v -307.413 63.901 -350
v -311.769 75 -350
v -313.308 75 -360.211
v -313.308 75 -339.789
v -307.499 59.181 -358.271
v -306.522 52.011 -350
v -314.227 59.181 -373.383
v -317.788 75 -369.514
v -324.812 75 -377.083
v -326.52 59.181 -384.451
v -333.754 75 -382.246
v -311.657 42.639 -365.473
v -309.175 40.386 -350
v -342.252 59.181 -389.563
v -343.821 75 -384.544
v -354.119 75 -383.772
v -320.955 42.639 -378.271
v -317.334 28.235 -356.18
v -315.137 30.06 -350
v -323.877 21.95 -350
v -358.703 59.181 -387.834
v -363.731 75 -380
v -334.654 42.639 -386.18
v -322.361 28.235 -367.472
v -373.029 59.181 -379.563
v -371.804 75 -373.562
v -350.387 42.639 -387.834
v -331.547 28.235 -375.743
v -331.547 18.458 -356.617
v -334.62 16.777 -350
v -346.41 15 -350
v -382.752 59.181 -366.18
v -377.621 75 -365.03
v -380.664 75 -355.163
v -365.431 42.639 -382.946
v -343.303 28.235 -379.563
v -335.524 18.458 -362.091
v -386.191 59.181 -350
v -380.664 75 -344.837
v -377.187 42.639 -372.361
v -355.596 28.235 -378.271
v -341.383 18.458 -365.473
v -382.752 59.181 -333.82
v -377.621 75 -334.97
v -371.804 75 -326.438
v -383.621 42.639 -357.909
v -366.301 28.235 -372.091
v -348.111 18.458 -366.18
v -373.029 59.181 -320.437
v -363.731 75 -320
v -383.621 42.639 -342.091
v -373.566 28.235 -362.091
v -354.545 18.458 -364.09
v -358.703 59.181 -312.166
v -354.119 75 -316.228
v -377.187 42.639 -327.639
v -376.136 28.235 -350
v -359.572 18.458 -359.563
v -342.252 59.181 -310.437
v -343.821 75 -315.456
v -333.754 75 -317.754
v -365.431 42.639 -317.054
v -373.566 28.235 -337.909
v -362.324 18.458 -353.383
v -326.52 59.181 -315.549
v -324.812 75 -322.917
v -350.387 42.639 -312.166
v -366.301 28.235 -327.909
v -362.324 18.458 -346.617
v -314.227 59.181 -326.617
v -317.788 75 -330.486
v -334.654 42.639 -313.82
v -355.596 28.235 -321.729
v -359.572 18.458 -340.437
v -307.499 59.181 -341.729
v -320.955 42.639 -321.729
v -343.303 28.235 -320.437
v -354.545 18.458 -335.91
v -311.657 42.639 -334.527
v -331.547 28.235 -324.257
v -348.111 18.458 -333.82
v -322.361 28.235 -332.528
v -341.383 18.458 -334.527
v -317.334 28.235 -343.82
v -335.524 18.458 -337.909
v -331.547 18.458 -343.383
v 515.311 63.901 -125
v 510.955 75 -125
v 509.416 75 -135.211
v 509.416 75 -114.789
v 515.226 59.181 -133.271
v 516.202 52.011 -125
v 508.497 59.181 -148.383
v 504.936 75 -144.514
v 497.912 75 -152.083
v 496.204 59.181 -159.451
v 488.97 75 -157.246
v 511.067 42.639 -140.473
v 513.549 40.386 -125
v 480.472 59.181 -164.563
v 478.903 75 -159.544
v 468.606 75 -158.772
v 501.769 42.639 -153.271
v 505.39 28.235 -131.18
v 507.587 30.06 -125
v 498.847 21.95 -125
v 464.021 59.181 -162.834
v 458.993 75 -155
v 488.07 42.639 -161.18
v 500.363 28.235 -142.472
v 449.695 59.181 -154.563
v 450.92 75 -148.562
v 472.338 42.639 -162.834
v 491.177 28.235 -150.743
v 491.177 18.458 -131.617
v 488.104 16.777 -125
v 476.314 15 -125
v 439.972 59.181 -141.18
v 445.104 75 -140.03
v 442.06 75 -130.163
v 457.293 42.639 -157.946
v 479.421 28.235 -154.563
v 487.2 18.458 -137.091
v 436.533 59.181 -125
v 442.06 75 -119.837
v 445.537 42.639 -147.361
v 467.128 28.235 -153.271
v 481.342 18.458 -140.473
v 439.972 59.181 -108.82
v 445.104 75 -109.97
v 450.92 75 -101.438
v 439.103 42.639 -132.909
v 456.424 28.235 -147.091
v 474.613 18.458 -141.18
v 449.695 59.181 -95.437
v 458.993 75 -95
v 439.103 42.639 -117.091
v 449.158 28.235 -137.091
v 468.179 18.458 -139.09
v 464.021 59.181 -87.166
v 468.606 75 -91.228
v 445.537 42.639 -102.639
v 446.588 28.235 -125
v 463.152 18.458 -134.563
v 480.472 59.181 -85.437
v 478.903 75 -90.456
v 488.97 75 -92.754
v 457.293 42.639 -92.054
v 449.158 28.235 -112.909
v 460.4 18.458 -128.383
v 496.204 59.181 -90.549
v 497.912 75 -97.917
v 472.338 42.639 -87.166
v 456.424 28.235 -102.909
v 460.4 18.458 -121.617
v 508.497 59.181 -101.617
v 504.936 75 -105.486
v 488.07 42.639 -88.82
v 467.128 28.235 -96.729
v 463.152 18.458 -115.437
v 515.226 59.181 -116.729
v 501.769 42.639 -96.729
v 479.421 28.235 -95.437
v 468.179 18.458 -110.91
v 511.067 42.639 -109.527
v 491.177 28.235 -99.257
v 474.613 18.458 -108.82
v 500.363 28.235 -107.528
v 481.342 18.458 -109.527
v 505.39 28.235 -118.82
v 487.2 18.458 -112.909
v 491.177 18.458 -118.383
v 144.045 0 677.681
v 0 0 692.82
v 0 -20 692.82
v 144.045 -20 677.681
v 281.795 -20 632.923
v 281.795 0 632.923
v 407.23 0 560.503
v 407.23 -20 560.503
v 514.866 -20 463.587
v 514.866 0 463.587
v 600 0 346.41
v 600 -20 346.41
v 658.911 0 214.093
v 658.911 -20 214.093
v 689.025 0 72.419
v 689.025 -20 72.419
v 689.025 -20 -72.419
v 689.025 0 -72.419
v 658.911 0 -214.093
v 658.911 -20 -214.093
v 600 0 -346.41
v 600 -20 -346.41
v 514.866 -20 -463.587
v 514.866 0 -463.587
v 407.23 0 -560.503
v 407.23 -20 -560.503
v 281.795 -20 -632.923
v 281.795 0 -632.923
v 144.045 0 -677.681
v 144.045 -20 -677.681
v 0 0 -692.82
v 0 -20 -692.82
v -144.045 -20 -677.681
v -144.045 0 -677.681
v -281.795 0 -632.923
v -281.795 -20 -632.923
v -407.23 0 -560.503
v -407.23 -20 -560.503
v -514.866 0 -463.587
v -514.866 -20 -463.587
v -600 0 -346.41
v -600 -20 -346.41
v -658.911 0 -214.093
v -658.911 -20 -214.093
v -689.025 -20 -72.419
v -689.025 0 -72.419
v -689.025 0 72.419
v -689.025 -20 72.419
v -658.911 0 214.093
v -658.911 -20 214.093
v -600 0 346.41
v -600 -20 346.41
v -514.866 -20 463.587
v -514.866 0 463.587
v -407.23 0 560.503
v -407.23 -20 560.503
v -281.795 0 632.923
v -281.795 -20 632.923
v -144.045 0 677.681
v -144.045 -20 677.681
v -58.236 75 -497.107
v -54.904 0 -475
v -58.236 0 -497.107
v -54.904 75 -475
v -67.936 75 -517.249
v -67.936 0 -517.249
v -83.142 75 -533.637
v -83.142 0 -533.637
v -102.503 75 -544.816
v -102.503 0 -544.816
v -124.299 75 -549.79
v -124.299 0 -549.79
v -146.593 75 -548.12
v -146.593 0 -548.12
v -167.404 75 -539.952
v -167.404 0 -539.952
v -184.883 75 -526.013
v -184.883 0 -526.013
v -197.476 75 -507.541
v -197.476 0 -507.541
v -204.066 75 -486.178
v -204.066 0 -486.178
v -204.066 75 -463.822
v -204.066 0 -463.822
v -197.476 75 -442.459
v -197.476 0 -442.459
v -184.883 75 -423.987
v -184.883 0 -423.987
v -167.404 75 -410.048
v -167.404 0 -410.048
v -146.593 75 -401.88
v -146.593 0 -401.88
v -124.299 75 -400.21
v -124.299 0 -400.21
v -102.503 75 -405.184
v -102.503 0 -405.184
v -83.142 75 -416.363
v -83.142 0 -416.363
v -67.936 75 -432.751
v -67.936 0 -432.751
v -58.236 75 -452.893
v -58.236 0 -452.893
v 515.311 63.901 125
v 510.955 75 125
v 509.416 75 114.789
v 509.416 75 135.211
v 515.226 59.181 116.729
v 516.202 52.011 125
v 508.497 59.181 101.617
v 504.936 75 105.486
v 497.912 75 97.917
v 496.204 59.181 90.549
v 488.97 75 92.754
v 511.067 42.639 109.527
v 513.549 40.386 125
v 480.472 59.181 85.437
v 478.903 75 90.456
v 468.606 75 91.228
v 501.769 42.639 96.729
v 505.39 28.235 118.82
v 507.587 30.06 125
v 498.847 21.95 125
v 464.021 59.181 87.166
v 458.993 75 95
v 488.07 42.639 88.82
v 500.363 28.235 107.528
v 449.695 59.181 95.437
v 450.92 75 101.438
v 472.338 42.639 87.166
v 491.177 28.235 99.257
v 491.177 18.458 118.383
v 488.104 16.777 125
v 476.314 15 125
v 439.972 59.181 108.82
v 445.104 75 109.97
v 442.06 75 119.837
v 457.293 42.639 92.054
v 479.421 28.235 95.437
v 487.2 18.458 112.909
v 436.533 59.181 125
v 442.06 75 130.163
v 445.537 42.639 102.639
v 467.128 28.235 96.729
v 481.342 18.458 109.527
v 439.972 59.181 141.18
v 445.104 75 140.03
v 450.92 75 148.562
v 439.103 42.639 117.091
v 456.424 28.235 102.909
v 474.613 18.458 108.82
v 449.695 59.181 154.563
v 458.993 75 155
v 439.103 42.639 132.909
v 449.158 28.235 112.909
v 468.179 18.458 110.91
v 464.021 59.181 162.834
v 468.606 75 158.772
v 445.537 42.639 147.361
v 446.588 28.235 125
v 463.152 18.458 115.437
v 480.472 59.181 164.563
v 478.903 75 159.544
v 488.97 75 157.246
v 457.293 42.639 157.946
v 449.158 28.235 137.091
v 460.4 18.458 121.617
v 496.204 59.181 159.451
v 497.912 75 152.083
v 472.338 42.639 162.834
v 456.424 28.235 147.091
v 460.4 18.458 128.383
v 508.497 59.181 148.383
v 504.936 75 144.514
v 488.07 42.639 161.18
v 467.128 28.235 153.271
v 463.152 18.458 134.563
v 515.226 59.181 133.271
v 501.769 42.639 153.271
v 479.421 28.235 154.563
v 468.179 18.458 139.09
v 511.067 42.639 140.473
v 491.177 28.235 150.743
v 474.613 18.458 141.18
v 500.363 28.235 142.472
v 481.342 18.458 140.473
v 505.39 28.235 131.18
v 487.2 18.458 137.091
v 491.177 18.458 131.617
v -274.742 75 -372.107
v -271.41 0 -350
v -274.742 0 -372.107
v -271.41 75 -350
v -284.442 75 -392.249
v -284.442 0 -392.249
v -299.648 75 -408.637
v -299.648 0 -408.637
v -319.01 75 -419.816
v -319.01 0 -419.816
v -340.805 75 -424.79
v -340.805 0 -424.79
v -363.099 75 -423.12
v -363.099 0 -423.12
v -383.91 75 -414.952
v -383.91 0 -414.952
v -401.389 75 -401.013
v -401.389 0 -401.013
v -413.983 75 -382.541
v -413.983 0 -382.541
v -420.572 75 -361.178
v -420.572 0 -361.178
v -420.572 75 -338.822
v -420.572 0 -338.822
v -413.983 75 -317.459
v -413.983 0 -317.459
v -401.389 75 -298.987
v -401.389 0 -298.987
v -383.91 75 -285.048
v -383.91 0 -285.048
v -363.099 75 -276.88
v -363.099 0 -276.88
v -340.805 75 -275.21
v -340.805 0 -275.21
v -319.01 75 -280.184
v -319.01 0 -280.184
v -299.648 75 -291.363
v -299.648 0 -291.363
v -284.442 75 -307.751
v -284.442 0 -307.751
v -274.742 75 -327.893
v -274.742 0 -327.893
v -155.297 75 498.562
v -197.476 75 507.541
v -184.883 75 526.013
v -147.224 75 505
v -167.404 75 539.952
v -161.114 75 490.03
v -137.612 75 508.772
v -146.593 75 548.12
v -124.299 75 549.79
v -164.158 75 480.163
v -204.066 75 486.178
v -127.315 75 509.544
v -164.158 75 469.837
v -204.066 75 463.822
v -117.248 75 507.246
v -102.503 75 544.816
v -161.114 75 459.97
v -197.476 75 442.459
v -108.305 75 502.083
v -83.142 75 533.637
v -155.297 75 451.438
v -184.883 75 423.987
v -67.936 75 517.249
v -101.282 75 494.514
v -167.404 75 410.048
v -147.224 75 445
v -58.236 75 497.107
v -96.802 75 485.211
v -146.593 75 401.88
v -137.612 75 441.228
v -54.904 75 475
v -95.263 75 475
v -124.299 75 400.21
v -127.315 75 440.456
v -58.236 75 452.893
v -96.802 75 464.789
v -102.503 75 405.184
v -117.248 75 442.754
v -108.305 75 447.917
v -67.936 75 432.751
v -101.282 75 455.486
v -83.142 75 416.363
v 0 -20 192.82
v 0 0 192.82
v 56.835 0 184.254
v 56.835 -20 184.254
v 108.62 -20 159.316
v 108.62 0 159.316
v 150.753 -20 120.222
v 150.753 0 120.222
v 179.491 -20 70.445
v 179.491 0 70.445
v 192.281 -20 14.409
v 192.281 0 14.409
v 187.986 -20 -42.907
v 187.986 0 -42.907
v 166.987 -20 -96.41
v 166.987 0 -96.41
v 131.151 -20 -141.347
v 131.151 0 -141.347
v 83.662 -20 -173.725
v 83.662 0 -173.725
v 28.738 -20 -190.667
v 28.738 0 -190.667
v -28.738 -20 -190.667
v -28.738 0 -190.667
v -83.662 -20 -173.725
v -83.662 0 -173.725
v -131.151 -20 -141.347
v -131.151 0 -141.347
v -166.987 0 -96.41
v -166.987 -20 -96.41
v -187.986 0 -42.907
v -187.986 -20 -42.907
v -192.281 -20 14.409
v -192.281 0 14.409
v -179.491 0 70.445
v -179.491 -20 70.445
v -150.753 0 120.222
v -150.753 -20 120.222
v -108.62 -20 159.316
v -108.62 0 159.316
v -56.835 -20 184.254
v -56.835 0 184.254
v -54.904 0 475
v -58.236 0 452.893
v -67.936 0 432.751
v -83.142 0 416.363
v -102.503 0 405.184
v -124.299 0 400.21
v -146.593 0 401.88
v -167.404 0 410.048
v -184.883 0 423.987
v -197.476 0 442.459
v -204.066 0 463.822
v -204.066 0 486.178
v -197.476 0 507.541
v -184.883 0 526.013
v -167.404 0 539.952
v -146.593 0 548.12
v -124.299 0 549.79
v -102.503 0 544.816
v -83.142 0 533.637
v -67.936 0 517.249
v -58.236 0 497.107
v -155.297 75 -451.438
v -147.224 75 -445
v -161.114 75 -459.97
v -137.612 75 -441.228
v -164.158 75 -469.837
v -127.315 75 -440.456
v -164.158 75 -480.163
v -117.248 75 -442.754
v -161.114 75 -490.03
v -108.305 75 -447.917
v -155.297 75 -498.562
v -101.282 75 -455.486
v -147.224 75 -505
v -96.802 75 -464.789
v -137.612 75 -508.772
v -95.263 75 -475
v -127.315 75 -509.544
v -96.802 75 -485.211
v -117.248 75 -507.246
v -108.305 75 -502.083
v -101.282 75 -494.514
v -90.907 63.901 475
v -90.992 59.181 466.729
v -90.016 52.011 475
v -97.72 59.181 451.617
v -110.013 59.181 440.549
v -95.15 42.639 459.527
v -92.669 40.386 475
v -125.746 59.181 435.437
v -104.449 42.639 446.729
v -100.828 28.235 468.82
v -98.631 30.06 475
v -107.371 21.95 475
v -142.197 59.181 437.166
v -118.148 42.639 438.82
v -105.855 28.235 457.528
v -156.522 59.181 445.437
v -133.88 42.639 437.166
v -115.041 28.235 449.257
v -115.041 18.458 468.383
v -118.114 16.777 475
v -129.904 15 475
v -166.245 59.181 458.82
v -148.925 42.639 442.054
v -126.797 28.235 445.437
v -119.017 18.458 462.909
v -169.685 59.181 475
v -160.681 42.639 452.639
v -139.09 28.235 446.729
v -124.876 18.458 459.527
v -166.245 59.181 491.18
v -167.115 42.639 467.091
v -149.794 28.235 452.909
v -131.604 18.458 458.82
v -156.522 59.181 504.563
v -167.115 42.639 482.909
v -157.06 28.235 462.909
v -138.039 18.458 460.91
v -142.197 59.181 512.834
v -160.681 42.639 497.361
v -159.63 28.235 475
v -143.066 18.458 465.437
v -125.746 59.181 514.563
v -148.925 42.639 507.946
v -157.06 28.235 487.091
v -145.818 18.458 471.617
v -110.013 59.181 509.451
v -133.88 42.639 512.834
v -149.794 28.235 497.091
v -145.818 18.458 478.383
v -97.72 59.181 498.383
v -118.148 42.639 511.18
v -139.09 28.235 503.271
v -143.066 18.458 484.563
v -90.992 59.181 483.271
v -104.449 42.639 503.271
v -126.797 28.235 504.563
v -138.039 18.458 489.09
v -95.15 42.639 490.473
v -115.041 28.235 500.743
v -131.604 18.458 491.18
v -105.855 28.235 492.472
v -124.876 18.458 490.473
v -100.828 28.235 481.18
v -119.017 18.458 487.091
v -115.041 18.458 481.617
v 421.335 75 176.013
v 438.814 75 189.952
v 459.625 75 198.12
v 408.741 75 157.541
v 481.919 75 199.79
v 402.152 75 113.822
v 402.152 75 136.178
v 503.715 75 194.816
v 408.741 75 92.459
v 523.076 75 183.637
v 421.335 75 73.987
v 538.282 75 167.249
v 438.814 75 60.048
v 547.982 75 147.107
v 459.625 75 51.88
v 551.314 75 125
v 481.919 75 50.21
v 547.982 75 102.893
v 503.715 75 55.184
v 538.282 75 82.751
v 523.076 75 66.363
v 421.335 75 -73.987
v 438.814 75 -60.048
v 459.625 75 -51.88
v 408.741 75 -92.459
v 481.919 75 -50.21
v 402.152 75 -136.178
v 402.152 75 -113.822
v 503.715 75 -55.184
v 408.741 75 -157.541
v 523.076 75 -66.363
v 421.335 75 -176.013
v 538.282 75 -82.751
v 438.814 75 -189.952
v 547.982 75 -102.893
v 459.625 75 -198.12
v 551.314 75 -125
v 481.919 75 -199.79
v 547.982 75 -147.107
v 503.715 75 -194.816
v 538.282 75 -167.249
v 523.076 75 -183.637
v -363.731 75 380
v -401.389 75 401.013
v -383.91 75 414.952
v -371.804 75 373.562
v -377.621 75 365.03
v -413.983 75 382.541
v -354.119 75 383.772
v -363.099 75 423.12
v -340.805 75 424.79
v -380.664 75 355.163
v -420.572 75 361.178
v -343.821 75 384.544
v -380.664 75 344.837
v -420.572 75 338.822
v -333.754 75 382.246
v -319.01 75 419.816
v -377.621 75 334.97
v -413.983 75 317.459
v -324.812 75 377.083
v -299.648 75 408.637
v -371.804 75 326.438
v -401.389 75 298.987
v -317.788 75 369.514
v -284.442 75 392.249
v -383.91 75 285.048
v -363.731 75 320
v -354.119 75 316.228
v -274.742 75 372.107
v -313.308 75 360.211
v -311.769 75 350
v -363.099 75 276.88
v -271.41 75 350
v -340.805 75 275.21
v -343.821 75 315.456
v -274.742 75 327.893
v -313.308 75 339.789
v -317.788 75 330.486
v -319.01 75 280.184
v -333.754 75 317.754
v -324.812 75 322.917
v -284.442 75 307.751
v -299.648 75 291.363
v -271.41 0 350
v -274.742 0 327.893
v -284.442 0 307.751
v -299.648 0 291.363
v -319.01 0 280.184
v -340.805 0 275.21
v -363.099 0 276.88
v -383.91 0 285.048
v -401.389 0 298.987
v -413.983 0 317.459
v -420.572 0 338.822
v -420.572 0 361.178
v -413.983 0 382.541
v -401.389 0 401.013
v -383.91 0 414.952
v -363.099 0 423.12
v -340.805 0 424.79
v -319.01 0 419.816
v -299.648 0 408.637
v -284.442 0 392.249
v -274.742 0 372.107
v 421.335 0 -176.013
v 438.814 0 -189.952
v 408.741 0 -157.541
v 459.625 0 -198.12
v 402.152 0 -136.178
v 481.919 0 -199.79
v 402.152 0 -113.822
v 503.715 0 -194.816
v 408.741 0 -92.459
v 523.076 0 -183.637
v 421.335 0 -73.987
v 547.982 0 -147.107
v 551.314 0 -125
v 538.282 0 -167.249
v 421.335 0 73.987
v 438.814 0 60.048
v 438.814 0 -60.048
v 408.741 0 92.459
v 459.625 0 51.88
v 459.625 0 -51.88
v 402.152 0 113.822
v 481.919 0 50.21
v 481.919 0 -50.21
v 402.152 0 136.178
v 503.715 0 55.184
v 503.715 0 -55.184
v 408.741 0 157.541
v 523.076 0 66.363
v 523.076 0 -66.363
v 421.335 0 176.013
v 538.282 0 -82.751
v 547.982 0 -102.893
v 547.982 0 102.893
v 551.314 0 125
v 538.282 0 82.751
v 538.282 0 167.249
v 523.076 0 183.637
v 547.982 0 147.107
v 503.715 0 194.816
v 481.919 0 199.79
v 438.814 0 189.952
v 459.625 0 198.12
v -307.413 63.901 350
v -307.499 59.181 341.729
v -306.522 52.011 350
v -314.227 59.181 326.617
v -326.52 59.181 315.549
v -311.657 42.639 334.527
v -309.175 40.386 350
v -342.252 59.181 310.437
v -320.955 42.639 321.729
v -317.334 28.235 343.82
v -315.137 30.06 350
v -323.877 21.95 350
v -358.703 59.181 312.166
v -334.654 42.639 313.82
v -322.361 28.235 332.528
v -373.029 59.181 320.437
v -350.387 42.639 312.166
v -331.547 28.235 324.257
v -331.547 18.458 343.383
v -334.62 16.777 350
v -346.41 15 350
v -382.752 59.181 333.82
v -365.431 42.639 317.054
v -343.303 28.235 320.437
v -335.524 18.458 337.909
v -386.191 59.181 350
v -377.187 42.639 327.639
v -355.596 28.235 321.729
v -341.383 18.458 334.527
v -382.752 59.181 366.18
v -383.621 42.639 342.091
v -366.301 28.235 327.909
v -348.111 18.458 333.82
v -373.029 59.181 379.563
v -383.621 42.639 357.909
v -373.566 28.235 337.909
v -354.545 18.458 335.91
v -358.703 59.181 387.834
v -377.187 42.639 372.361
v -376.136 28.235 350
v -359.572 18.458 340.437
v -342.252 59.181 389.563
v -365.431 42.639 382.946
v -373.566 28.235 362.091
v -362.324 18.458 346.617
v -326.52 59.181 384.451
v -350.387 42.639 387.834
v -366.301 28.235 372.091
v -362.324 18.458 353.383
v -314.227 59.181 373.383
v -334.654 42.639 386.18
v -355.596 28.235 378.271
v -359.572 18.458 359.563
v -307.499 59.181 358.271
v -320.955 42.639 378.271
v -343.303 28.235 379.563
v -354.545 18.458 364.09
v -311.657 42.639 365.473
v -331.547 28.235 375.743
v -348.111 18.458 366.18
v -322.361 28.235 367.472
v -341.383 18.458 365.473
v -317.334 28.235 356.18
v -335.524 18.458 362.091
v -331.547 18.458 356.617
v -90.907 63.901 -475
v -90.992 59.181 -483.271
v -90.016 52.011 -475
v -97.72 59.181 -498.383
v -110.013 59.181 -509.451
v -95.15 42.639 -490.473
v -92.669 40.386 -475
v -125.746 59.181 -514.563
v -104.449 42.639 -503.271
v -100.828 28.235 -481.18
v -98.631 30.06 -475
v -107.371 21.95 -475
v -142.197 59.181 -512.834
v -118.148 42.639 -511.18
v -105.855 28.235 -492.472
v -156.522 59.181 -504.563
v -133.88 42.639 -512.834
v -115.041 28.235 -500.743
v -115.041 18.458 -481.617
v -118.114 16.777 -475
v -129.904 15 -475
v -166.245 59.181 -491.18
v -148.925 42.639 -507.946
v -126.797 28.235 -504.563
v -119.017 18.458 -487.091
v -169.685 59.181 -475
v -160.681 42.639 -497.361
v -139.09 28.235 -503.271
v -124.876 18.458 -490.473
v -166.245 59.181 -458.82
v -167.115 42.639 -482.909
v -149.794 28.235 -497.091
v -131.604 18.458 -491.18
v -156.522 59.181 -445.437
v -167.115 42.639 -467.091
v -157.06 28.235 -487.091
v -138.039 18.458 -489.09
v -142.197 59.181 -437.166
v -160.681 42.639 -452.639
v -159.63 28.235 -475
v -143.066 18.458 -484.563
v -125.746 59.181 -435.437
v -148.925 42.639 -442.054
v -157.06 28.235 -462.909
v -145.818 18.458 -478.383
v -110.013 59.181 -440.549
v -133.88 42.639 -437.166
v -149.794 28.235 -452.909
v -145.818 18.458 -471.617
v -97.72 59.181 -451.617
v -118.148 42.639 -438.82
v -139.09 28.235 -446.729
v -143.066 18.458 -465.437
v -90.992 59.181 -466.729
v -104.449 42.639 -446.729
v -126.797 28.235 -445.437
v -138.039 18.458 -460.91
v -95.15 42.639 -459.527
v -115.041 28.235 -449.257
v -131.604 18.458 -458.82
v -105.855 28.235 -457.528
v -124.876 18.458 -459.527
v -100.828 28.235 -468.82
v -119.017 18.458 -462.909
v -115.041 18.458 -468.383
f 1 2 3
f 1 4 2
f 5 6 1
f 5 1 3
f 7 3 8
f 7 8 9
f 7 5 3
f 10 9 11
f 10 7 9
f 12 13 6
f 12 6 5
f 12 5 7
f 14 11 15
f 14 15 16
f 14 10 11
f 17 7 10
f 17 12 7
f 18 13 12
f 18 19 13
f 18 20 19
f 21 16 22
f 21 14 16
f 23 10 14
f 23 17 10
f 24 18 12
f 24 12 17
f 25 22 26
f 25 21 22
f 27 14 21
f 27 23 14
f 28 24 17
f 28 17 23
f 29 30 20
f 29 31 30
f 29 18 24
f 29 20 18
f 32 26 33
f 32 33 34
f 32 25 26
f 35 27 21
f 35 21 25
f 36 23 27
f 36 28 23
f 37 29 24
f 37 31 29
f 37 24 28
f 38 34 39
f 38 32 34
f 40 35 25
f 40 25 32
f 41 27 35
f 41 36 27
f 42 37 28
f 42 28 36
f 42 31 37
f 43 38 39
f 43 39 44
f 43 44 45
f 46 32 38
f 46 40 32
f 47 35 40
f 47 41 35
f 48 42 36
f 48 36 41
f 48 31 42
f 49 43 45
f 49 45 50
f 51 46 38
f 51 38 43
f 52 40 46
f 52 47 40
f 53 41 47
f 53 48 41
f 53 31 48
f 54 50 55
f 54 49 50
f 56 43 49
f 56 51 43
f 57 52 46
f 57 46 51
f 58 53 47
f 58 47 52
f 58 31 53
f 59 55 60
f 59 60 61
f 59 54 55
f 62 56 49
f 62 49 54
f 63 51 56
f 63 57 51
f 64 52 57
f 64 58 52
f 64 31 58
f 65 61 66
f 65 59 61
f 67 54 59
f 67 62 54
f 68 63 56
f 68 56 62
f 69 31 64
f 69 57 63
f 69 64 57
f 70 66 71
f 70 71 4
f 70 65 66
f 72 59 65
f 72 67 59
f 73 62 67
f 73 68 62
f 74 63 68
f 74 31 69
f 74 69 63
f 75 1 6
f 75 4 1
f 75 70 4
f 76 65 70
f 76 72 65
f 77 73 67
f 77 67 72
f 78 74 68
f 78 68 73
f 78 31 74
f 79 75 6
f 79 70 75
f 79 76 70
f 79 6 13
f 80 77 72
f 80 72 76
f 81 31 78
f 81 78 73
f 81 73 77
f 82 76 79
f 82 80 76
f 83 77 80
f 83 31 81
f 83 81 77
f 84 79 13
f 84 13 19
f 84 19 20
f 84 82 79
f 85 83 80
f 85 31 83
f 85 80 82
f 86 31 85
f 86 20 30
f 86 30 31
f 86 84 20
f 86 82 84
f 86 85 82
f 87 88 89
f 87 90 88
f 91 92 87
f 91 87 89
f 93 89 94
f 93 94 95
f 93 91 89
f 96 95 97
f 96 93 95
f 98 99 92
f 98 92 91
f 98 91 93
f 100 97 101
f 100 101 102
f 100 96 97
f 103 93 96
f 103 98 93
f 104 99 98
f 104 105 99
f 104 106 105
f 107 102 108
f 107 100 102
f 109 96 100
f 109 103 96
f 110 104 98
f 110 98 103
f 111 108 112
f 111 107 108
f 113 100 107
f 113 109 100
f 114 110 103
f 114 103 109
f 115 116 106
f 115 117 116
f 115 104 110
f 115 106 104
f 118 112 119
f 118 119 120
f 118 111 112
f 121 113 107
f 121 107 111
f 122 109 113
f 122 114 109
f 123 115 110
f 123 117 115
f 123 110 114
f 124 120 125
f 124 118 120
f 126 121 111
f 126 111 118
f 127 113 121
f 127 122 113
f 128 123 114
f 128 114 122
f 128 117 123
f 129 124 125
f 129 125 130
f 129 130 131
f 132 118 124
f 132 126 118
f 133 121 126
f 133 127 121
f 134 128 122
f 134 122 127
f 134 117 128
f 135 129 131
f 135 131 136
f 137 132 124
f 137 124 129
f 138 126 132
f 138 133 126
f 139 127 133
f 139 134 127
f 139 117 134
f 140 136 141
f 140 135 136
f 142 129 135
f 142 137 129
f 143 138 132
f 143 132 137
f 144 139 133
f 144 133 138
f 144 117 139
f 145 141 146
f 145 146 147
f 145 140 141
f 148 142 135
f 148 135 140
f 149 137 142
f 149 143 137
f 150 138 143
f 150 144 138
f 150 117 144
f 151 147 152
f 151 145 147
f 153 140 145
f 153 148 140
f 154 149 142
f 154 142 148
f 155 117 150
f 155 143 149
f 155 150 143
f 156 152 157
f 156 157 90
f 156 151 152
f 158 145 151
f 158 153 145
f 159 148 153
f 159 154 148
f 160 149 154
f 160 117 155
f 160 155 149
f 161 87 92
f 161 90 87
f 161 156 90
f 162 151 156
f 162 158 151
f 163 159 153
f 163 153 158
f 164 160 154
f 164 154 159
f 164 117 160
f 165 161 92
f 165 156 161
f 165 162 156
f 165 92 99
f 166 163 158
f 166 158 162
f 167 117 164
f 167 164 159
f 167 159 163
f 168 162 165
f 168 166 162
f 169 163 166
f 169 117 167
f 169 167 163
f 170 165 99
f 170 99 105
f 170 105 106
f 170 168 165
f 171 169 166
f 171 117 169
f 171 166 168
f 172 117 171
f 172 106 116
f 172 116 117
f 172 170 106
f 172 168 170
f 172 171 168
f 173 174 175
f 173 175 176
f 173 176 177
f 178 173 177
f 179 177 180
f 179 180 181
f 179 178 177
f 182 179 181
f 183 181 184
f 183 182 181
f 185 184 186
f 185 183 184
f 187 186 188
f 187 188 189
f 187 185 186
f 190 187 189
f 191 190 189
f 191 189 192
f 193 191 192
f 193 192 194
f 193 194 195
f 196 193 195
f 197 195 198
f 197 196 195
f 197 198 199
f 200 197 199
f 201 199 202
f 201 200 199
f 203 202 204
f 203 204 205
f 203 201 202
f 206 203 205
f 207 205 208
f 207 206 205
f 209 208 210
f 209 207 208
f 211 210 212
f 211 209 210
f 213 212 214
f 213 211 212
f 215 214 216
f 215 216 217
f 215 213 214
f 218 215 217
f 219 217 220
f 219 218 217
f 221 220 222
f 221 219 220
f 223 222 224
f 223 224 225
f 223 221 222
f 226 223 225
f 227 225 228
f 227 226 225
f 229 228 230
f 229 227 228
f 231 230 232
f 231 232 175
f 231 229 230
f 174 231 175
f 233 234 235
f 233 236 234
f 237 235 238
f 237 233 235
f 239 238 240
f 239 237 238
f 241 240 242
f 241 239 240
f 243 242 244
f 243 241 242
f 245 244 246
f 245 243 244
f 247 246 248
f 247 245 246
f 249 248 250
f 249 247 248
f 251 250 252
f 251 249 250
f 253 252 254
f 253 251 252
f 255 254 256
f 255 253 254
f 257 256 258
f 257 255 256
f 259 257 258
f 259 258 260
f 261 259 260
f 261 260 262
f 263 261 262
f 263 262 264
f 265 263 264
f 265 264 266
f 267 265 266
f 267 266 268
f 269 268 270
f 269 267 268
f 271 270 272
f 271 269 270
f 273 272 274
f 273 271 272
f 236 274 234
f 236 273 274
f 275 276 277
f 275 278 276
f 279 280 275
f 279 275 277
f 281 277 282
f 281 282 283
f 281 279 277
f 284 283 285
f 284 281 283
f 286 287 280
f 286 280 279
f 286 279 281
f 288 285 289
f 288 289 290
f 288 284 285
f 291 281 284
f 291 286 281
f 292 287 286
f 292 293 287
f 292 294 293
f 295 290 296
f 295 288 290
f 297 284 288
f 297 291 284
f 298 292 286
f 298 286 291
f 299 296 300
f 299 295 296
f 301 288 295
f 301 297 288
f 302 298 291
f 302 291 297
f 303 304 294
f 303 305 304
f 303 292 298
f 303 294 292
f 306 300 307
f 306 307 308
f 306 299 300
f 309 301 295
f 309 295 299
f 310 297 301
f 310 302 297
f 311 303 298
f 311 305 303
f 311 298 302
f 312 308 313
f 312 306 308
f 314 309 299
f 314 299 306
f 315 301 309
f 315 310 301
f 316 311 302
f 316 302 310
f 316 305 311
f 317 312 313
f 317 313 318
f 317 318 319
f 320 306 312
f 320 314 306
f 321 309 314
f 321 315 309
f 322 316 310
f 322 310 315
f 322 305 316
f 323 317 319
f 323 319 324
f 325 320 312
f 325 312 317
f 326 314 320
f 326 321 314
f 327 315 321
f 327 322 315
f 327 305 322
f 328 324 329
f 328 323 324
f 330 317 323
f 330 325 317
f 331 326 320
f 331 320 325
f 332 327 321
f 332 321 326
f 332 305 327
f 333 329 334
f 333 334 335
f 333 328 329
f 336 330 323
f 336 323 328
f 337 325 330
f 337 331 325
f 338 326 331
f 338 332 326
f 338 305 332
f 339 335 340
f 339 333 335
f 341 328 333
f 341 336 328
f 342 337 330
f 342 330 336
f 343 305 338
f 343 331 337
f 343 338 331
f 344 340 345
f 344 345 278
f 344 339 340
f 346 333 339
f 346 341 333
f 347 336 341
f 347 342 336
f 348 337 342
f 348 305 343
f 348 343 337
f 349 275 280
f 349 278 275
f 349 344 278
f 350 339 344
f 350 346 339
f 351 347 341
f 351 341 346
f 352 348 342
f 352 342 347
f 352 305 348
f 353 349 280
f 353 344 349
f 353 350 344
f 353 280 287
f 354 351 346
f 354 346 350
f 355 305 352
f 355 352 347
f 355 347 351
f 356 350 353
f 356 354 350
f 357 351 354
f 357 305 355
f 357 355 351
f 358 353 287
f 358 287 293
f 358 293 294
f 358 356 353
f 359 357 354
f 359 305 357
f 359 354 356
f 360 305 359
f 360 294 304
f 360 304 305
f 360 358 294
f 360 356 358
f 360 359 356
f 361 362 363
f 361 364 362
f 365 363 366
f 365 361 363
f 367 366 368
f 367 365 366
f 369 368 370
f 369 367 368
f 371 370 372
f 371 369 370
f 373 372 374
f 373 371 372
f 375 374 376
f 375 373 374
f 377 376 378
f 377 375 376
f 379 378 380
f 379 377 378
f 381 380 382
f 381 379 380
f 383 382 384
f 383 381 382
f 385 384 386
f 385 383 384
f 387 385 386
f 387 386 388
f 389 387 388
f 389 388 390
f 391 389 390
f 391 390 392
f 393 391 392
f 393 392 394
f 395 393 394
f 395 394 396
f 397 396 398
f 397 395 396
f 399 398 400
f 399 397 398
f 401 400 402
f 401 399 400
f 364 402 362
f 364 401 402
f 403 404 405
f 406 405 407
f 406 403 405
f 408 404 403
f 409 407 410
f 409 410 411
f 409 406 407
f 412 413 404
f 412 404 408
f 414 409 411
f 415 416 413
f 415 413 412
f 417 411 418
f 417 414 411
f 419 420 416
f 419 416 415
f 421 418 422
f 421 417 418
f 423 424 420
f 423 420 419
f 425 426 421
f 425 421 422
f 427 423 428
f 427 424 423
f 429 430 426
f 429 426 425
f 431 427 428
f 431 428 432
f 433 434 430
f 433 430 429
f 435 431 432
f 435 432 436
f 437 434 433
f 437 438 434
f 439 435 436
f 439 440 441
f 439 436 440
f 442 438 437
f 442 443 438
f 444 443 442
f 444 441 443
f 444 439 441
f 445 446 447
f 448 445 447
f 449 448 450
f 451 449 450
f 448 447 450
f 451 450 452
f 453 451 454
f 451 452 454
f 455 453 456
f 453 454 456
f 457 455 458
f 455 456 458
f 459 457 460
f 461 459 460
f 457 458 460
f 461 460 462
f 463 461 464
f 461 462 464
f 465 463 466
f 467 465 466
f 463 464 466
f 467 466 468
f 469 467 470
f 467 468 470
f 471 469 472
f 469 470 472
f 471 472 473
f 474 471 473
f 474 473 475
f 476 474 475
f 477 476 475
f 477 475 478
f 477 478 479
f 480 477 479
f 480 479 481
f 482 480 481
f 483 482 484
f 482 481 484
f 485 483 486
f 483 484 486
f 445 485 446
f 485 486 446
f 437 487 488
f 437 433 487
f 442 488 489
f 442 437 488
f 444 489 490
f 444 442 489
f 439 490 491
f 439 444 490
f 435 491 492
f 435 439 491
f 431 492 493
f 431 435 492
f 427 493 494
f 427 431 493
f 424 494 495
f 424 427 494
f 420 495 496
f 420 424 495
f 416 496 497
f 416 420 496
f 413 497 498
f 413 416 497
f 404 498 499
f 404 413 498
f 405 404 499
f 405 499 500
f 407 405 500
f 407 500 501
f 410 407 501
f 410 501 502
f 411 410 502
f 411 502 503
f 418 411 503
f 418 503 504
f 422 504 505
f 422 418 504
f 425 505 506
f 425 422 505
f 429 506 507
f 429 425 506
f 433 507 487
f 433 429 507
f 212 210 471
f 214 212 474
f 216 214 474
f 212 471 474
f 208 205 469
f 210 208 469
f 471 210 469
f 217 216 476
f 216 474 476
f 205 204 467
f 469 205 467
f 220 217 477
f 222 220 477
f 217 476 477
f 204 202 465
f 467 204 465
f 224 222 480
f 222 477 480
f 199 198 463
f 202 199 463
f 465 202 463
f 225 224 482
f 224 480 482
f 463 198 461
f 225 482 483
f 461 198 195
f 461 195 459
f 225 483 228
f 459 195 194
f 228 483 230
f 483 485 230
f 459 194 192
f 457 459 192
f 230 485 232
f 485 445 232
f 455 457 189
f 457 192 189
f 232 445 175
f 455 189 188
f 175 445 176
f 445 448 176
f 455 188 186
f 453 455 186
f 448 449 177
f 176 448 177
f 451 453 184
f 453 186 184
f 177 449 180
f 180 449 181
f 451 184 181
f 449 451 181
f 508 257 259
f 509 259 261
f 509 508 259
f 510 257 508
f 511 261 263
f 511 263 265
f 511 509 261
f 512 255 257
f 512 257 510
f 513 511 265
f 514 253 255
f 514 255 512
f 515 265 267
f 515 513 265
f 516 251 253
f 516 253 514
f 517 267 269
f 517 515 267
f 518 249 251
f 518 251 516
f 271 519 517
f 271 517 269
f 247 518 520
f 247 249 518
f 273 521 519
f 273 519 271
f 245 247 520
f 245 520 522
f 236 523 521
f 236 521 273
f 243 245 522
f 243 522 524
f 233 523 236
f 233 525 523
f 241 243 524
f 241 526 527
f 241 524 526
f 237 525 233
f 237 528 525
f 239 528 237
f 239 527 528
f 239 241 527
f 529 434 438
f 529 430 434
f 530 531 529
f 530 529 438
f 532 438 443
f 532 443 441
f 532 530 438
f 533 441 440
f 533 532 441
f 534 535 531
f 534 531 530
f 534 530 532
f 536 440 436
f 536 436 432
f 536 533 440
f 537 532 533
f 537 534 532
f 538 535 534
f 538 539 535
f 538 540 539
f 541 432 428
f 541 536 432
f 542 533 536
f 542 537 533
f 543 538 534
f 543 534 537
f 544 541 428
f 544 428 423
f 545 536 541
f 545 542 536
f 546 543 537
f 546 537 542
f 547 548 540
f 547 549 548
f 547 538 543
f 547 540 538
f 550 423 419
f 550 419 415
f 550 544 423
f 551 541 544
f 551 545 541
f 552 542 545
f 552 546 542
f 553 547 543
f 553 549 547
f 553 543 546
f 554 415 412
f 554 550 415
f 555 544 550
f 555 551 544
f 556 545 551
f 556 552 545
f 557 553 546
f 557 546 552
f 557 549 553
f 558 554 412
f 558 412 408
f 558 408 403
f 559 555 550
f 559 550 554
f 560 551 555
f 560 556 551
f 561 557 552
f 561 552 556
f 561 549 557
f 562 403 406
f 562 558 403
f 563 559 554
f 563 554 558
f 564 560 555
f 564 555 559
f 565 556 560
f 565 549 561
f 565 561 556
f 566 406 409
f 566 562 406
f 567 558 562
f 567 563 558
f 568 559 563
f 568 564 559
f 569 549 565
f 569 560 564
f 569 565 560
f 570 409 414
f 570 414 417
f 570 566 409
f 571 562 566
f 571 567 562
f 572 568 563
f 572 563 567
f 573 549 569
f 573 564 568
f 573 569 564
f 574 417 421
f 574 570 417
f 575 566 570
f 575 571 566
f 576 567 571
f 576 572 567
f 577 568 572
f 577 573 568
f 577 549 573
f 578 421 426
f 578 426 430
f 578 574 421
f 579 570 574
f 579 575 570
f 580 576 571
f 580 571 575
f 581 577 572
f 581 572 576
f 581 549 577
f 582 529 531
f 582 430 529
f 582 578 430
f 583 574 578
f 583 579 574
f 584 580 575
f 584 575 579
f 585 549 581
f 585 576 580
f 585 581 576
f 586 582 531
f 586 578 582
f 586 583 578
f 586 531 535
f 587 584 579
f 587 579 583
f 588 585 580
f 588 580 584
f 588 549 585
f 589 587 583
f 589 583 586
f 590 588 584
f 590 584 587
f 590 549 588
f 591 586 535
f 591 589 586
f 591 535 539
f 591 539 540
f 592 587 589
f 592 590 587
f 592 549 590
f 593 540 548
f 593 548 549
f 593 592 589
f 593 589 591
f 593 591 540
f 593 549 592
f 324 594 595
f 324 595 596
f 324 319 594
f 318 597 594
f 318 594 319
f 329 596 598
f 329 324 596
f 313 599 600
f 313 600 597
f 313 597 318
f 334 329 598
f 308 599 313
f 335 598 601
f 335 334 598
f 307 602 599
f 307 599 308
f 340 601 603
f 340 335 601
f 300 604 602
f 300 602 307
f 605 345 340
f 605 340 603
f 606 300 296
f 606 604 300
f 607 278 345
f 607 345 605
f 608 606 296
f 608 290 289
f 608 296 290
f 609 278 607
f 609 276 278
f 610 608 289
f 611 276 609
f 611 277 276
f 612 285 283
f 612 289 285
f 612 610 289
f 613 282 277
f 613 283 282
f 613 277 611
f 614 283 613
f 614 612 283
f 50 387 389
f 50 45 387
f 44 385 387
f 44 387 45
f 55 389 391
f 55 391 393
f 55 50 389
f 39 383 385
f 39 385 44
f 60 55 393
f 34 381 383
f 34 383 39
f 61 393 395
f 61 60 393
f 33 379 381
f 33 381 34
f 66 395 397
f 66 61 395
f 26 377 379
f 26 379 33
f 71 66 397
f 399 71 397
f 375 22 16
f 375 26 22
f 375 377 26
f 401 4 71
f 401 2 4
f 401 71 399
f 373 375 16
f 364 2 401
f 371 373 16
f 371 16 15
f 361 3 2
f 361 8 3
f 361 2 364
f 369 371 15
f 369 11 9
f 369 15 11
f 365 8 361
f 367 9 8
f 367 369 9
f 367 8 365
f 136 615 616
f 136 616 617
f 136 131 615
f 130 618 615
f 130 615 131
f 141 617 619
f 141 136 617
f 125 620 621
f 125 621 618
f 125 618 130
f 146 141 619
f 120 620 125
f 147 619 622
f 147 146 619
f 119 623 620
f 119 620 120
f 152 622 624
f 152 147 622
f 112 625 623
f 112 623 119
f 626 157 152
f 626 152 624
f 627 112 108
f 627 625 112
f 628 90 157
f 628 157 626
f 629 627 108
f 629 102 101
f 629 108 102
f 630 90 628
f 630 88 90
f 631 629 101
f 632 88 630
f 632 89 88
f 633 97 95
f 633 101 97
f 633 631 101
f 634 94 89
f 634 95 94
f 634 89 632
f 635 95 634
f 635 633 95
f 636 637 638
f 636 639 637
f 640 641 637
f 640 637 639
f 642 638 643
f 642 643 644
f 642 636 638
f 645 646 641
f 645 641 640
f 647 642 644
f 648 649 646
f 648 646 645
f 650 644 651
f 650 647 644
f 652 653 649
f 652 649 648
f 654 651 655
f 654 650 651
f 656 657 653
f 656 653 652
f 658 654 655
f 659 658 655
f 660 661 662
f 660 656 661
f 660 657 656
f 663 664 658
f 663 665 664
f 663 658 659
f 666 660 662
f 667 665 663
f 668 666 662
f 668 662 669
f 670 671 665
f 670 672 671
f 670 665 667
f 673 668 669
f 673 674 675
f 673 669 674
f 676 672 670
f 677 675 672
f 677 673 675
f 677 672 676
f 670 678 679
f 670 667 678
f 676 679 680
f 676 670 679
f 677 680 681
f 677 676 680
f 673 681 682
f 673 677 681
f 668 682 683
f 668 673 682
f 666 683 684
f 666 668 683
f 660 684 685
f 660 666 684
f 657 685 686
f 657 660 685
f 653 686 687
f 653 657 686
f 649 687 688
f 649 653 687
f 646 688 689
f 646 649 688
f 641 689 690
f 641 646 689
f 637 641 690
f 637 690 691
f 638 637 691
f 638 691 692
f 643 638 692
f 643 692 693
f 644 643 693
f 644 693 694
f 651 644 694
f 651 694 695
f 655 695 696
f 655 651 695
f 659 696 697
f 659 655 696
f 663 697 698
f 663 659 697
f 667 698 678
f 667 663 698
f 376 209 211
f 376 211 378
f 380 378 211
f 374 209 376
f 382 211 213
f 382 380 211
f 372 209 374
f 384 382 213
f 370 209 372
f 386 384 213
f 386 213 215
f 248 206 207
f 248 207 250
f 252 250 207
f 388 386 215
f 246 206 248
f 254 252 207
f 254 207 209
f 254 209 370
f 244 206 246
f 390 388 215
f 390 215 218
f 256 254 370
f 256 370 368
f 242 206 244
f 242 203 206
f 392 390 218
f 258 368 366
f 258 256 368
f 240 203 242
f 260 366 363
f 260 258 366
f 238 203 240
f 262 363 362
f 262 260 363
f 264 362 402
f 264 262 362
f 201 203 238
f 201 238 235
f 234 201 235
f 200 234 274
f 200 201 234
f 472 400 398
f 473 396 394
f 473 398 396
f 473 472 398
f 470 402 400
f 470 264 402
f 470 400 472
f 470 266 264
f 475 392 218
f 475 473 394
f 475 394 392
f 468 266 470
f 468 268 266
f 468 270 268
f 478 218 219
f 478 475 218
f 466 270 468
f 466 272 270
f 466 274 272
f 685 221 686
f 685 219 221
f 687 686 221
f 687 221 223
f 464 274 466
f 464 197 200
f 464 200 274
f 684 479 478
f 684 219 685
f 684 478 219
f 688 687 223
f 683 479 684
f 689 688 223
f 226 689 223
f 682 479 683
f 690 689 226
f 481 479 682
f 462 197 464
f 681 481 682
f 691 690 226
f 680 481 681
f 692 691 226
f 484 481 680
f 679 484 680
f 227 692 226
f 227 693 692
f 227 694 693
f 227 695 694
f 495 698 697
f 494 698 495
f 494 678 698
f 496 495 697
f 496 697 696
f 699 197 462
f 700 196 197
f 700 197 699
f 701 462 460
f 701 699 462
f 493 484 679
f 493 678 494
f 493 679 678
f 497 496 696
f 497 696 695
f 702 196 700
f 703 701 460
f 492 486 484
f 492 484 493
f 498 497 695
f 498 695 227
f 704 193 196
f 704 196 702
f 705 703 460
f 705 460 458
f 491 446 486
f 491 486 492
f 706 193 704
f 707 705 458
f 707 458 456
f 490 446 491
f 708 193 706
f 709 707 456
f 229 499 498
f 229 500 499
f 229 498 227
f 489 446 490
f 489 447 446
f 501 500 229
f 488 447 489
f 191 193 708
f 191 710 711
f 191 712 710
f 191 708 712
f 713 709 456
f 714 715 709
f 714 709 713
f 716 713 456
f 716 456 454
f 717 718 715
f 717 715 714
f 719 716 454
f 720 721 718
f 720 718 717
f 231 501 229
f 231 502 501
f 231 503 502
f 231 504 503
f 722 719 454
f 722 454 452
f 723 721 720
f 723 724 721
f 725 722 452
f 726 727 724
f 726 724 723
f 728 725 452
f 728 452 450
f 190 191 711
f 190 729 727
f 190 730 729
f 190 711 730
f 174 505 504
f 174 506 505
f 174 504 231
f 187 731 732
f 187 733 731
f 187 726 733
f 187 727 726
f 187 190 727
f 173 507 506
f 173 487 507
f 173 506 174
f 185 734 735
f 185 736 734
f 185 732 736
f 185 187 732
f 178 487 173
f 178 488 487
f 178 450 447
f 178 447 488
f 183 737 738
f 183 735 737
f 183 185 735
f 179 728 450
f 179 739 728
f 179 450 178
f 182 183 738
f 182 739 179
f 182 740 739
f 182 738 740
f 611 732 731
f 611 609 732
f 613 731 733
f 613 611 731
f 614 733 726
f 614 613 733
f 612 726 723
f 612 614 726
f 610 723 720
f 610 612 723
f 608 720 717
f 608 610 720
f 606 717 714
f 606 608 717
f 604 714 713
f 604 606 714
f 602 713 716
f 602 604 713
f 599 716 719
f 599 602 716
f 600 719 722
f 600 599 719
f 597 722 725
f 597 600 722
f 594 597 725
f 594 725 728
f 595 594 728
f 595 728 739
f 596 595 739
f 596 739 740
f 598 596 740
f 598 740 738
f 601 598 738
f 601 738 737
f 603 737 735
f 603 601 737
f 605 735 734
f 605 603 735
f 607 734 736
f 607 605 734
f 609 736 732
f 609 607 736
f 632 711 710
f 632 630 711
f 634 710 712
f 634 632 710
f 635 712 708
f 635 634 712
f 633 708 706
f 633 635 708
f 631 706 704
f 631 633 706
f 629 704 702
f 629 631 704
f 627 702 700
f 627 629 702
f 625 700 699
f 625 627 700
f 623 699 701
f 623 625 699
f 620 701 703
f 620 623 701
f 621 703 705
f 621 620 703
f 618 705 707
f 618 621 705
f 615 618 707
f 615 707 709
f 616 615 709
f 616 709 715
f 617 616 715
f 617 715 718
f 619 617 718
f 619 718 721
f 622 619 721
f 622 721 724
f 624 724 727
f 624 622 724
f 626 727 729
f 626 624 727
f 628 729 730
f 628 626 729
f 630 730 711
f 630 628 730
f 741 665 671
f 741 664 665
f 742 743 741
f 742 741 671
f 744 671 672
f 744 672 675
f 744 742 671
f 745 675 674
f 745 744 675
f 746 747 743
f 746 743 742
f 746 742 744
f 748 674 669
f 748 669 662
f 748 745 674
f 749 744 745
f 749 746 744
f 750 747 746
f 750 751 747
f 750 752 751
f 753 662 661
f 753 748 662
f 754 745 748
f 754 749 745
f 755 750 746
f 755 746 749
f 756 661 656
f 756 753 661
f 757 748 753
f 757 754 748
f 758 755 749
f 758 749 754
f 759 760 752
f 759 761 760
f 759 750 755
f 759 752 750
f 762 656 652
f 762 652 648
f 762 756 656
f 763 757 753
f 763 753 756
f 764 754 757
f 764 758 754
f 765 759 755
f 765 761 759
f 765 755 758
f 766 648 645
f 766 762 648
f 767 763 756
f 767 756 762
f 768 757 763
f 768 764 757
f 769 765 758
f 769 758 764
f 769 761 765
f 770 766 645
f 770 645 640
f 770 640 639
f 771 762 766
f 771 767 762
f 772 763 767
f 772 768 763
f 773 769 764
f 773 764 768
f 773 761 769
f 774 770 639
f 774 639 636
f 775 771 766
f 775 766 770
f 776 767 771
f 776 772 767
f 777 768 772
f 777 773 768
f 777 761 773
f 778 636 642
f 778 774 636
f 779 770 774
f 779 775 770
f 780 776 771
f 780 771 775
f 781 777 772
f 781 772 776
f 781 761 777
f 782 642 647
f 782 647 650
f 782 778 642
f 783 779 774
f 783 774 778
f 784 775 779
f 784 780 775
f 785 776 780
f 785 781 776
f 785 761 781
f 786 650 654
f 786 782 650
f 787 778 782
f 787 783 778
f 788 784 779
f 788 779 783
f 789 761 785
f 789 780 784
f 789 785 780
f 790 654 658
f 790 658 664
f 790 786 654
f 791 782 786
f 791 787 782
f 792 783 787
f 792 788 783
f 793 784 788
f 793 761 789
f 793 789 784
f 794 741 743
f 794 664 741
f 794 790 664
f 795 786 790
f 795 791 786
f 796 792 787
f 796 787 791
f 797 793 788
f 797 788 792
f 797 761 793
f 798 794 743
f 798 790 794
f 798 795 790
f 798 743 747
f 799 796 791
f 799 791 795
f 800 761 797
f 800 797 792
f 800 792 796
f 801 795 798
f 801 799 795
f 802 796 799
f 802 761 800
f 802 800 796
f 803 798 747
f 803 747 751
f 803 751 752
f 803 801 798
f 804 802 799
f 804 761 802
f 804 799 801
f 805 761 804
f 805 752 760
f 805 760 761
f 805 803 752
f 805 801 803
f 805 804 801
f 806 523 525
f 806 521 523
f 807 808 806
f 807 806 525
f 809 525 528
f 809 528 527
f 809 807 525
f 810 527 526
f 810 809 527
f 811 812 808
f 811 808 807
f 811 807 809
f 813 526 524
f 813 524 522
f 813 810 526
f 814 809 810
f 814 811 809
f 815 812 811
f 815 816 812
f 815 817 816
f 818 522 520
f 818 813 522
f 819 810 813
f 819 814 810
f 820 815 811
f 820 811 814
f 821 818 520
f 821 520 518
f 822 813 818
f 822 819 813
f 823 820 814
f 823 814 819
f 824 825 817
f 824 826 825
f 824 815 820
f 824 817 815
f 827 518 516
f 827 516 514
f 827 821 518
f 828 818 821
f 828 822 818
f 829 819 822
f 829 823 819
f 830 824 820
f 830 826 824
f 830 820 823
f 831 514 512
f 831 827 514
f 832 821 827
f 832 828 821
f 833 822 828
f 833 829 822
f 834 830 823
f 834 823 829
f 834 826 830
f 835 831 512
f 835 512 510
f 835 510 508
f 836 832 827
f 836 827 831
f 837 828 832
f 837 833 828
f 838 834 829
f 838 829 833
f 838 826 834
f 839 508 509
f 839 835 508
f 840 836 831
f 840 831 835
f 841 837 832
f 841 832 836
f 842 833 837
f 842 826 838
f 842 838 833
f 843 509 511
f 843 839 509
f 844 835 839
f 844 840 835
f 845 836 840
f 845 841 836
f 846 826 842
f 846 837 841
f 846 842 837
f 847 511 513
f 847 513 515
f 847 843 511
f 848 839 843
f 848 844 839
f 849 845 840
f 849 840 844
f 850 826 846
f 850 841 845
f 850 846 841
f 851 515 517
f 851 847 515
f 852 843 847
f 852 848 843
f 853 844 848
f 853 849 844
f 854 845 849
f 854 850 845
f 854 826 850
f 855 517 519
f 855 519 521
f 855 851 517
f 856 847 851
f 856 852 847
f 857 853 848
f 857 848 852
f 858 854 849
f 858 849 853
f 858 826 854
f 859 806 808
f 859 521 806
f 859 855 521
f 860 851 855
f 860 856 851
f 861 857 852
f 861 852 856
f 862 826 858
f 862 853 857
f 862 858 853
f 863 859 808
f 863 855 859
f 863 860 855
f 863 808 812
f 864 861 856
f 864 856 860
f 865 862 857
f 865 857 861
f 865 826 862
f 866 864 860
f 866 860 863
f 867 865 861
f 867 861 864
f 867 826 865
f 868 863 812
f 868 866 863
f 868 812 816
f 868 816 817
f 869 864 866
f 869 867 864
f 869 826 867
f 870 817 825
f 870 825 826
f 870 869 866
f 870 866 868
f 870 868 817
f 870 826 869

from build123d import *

# Parameters (mm, degrees)
SKETCH1_R          = 692.820324
SKETCH1_R_2        = 192.820324
EXTRUDE1_DEPTH     = 20
SKETCH2_R          = 75
CUT_EXTRUDE1_DEPTH = 10


# Read off the part's stored shape, not the designer's step: 连接重组1
with BuildPart() as part:
    # Sketch1 → Extrude1 (new body)
    with BuildSketch(Plane(origin=(0, 0, 0), x_dir=(1, 0, 0), z_dir=(0, 1, 0))):
        with Locations(Location((0, 0, 0), (0, 0, 270))):
            Circle(SKETCH1_R)
        with Locations(Location((0, 0, 0), (0, 0, 270))):
            Circle(SKETCH1_R_2, mode=Mode.SUBTRACT)
    extrude(amount=-EXTRUDE1_DEPTH)

    # Sketch2 → Cut-Extrude1 (cut)
    with BuildSketch(Plane(origin=(0, 0, 0), x_dir=(1, 0, 0), z_dir=(0, 1, 0))):
        with Locations(Location((-129.90381057, 475, 0), (0, 0, 270))):
            Circle(SKETCH2_R)
        with Locations(Location((-129.90381057, -475, 0), (0, 0, 270))):
            Circle(SKETCH2_R)
        with Locations(Location((476.314, -125, 0), (0, 0, 270))):
            Circle(SKETCH2_R)
        with Locations(Location((-346.4101615, 350, 0), (0, 0, 270))):
            Circle(SKETCH2_R)
        with Locations(Location((-346.4101615, -350, 0), (0, 0, 270))):
            Circle(SKETCH2_R)
        with Locations(Location((476.314, 125, 0), (0, 0, 270))):
            Circle(SKETCH2_R)
    extrude(amount=-CUT_EXTRUDE1_DEPTH, mode=Mode.SUBTRACT)

    # 连接重组1 outline → 连接重组1 (revolve)
    with BuildSketch(Plane(origin=(476.314, 0, 125), x_dir=(1, 0, 0), z_dir=(0, 0, 1))):
        with BuildLine():
            Line((75, 75), (34.641016131, 75.000000035))
            ThreePointArc((34.641016131, 75.000000035), (34.641016161, 35.000000018), (0, 15))
            Line((0, 15), (0, -10))
            Line((0, -10), (75, -10))
            Line((75, -10), (75, 75))
        make_face()
    revolve(axis=Axis((476.314, 0, 125), (0, 1, 0)))

    # Other 1 2 outline → Other 1 2 (revolve)
    with BuildSketch(Plane(origin=(-129.90381057, 0, 475), x_dir=(1, 0, 0), z_dir=(0, 0, 1))):
        with BuildLine():
            Line((75, 75), (34.641016131, 75.000000035))
            ThreePointArc((34.641016131, 75.000000035), (34.641016161, 35.000000018), (0, 15))
            Line((0, 15), (0, -10))
            Line((0, -10), (75, -10))
            Line((75, -10), (75, 75))
        make_face()
    revolve(axis=Axis((-129.90381057, 0, 475), (0, 1, 0)))

    # Other 1 3 outline → Other 1 3 (revolve)
    with BuildSketch(Plane(origin=(-346.4101615, 0, -350), x_dir=(1, 0, 0), z_dir=(0, 0, 1))):
        with BuildLine():
            Line((75, 75), (34.641016131, 75.000000035))
            ThreePointArc((34.641016131, 75.000000035), (34.641016161, 35.000000018), (0, 15))
            Line((0, 15), (0, -10))
            Line((0, -10), (75, -10))
            Line((75, -10), (75, 75))
        make_face()
    revolve(axis=Axis((-346.4101615, 0, -350), (0, 1, 0)))

    # Other 1 4 outline → Other 1 4 (revolve)
    with BuildSketch(Plane(origin=(-129.90381057, 0, -475), x_dir=(1, 0, 0), z_dir=(0, 0, 1))):
        with BuildLine():
            Line((75, 75), (34.641016131, 75.000000035))
            ThreePointArc((34.641016131, 75.000000035), (34.641016161, 35.000000018), (0, 15))
            Line((0, 15), (0, -10))
            Line((0, -10), (75, -10))
            Line((75, -10), (75, 75))
        make_face()
    revolve(axis=Axis((-129.90381057, 0, -475), (0, 1, 0)))

    # Other 1 5 outline → Other 1 5 (revolve)
    with BuildSketch(Plane(origin=(-346.4101615, 0, 350), x_dir=(1, 0, 0), z_dir=(0, 0, 1))):
        with BuildLine():
            Line((75, 75), (34.641016131, 75.000000035))
            ThreePointArc((34.641016131, 75.000000035), (34.641016161, 35.000000018), (0, 15))
            Line((0, 15), (0, -10))
            Line((0, -10), (75, -10))
            Line((75, -10), (75, 75))
        make_face()
    revolve(axis=Axis((-346.4101615, 0, 350), (0, 1, 0)))

    # Other 1 6 outline → Other 1 6 (revolve)
    with BuildSketch(Plane(origin=(476.314, 0, -125), x_dir=(1, 0, 0), z_dir=(0, 0, 1))):
        with BuildLine():
            Line((75, 75), (34.641016131, 75.000000035))
            ThreePointArc((34.641016131, 75.000000035), (34.641016161, 35.000000018), (0, 15))
            Line((0, 15), (0, -10))
            Line((0, -10), (75, -10))
            Line((75, -10), (75, 75))
        make_face()
    revolve(axis=Axis((476.314, 0, -125), (0, 1, 0)))


solid = part.part
